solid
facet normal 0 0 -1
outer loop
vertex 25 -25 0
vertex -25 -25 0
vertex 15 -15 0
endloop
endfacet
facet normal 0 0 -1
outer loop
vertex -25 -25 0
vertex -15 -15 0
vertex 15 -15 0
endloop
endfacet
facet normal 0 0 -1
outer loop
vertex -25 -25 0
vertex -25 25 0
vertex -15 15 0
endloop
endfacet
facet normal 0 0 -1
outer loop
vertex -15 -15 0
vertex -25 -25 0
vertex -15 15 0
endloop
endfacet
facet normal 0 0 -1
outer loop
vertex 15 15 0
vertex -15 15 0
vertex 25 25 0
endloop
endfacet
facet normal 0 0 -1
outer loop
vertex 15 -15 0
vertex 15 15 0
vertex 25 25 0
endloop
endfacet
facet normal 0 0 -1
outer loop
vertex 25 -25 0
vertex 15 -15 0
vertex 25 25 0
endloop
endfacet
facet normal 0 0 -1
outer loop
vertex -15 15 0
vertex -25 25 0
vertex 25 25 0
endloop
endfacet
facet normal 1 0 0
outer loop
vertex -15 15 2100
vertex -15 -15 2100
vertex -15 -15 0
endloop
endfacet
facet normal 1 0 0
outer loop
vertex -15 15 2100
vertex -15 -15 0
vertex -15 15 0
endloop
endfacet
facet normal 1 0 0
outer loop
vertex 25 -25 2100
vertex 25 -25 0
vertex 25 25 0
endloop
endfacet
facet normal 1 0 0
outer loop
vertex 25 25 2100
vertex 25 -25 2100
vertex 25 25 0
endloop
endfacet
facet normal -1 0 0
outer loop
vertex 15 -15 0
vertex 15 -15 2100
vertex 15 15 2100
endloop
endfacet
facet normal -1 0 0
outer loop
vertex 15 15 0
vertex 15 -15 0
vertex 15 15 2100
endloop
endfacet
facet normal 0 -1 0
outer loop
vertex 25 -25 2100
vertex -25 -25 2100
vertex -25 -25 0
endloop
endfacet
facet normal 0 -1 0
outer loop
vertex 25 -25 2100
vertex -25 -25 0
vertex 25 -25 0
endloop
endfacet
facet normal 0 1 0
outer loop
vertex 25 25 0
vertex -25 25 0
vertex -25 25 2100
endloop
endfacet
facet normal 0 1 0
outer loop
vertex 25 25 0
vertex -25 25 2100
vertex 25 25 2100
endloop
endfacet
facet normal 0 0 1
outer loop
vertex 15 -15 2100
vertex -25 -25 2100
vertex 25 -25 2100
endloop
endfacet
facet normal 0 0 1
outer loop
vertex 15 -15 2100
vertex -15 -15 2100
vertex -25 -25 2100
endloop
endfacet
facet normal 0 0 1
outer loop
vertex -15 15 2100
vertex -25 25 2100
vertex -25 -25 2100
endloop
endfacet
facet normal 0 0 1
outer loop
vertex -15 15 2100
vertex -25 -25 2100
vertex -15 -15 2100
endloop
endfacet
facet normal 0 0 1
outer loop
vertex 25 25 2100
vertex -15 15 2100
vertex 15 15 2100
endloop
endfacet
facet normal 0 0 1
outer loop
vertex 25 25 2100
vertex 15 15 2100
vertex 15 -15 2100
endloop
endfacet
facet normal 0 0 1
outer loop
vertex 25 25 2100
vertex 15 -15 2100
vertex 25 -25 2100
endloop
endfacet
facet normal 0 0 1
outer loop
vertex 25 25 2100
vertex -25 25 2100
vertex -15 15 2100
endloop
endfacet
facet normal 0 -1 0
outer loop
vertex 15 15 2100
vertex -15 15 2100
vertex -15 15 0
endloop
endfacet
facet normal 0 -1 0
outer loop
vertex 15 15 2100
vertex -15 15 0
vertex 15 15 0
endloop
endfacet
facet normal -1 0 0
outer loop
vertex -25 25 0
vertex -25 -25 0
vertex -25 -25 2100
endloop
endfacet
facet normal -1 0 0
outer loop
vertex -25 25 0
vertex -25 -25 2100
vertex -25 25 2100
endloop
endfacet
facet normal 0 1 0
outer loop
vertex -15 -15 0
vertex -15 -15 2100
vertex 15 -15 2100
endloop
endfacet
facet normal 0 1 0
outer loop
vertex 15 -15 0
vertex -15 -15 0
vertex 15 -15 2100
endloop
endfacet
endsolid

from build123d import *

# Parameters (mm, degrees)
SKETCH1_W                 = 50
SKETCH1_H                 = 50
SKETCH1_W_2               = 30
SKETCH1_H_2               = 30
BOSS_EXTRUDE1_DEPTH       = 2100
SKETCH2_W                 = 50
SKETCH2_H                 = 50
BOSS_EXTRUDE2_DEPTH       = 5100
SKETCH4_W                 = 50
SKETCH4_H                 = 50
SKETCH4_W_2               = 30
SKETCH4_H_2               = 30
BOSS_EXTRUDE3_DEPTH       = 2100
SKETCH5_W                 = 50
SKETCH5_H                 = 50
BOSS_EXTRUDE4_DEPTH       = 1800
LPATTERN1_COUNT           = 2
LPATTERN1_PITCH           = 2000
SKETCH6_W                 = 100
SKETCH6_H                 = 150
BOSS_EXTRUDE5_DEPTH       = 5
SKETCH7_W                 = 100
SKETCH7_H                 = 150
BOSS_EXTRUDE6_DEPTH       = 5
SKETCH8_W                 = 100
SKETCH8_H                 = 150
BOSS_EXTRUDE7_DEPTH       = 5
SKETCH9_W                 = 100
SKETCH9_H                 = 150
BOSS_EXTRUDE8_DEPTH       = 5
SKETCH10_W                = 100
SKETCH10_H                = 5
BOSS_EXTRUDE9_DEPTH       = 20
SKETCH11_W                = 100
SKETCH11_H                = 5
BOSS_EXTRUDE10_DEPTH      = 20
SKETCH12_W                = 100
SKETCH12_H                = 5
BOSS_EXTRUDE11_DEPTH      = 20
SKETCH13_W                = 100
SKETCH13_H                = 5
BOSS_EXTRUDE12_DEPTH      = 20
F_5_0MM_DOWEL_HOLE1_D     = 5
F_5_0MM_DOWEL_HOLE1_DEPTH = 20
F_5_0MM_DOWEL_HOLE1_TIP   = 1.502151548
F_5_0MM_DOWEL_HOLE2_D     = 5
F_5_0MM_DOWEL_HOLE2_DEPTH = 20
F_5_0MM_DOWEL_HOLE2_TIP   = 1.502151548
F_5_0MM_DOWEL_HOLE3_D     = 5
F_5_0MM_DOWEL_HOLE3_DEPTH = 20
F_5_0MM_DOWEL_HOLE3_TIP   = 1.502151548
F_5_0MM_DOWEL_HOLE4_D     = 5
F_5_0MM_DOWEL_HOLE4_DEPTH = 20
F_5_0MM_DOWEL_HOLE4_TIP   = 1.502151548
SKETCH26_W                = 5305.980467783
SKETCH26_H                = 67.779411833
CUT_EXTRUDE1_DEPTH        = 5613.586302232
SPLIT1_OUTLINE_W          = 5150
SPLIT1_OUTLINE_H          = 50
SPLIT1_OUTLINE_W_2        = 30
SPLIT1_OUTLINE_H_2        = 30
SPLIT1_DEPTH              = 2100
SPLIT1_START              = -5
SPLIT1_2_OUTLINE_W        = 100
SPLIT1_2_OUTLINE_H        = 120
SPLIT1_2_OUTLINE_R        = 2.5
SPLIT1_2_DEPTH            = 2110
SPLIT3_START              = -5
SPLIT3_OUTLINE_W          = 100
SPLIT3_OUTLINE_H          = 120
SPLIT3_OUTLINE_R          = 2.5
SPLIT3_DEPTH              = 5
SPLIT4_START              = 2100
SPLIT4_OUTLINE_W          = 100
SPLIT4_OUTLINE_H          = 120
SPLIT4_OUTLINE_R          = 2.5
SPLIT4_DEPTH              = 5


# Read off the part's stored shape, not the designer's step: Split1, Split3, Split4
with BuildPart() as part:
    # Sketch1 → Boss-Extrude1 (new body)
    with BuildSketch(Plane.XY):
        Rectangle(SKETCH1_W, SKETCH1_H)
        Rectangle(SKETCH1_W_2, SKETCH1_H_2, mode=Mode.SUBTRACT)
    extrude(amount=BOSS_EXTRUDE1_DEPTH)

    # Sketch2 → Boss-Extrude2 (add)
    with BuildSketch(Plane.ZY.offset(25)):
        with Locations((125, 0)):
            Rectangle(SKETCH2_W, SKETCH2_H)
        with Locations((1975, 0)):
            Rectangle(SKETCH2_W, SKETCH2_H)
    extrude(amount=BOSS_EXTRUDE2_DEPTH)

    # Sketch4 → Boss-Extrude3 (add)
    with BuildSketch(Plane.XY):
        with Locations((-5150, 0)):
            Rectangle(SKETCH4_W, SKETCH4_H)
        with Locations((-5150, 0)):
            Rectangle(SKETCH4_W_2, SKETCH4_H_2, mode=Mode.SUBTRACT)
    extrude(amount=BOSS_EXTRUDE3_DEPTH)

    # Sketch5 → Boss-Extrude4 (add)
    with BuildSketch(Plane(origin=(0, 0, 1950), x_dir=(-1, 0, 0), z_dir=(0, 0, -1))):
        with Locations((1550, 0)):
            Rectangle(SKETCH5_W, SKETCH5_H)
    boss_extrude4 = extrude(amount=BOSS_EXTRUDE4_DEPTH)

    # LPattern1: Boss-Extrude4 ×2
    with Locations(*[(-i * LPATTERN1_PITCH, 0, 0) for i in range(1, LPATTERN1_COUNT)]):
        add(boss_extrude4)

    # Sketch6 → Boss-Extrude5 (add)
    with BuildSketch(Plane(origin=(0, 0, 0), x_dir=(-1, 0, 0), z_dir=(0, 0, -1))):
        Rectangle(SKETCH6_W, SKETCH6_H)
    extrude(amount=BOSS_EXTRUDE5_DEPTH)

    # Sketch7 → Boss-Extrude6 (add)
    with BuildSketch(Plane(origin=(0, 0, 0), x_dir=(-1, 0, 0), z_dir=(0, 0, -1))):
        with Locations((5150, 0)):
            Rectangle(SKETCH7_W, SKETCH7_H)
    extrude(amount=BOSS_EXTRUDE6_DEPTH)

    # Sketch8 → Boss-Extrude7 (add)
    with BuildSketch(Plane.XY.offset(2100)):
        with Locations((-5150, 0)):
            Rectangle(SKETCH8_W, SKETCH8_H)
    extrude(amount=BOSS_EXTRUDE7_DEPTH)

    # Sketch9 → Boss-Extrude8 (add)
    with BuildSketch(Plane.XY.offset(2100)):
        Rectangle(SKETCH9_W, SKETCH9_H)
    extrude(amount=BOSS_EXTRUDE8_DEPTH)

    # Sketch10 → Boss-Extrude9 (add)
    with BuildSketch(Plane(origin=(0, 75, 0), x_dir=(1, 0, 0), z_dir=(0, 1, 0))):
        with Locations((0, -2102.5)):
            Rectangle(SKETCH10_W, SKETCH10_H)
    extrude(amount=BOSS_EXTRUDE9_DEPTH)

    # Sketch11 → Boss-Extrude10 (add)
    with BuildSketch(Plane(origin=(0, 75, 0), x_dir=(1, 0, 0), z_dir=(0, 1, 0))):
        with Locations((0, 2.5)):
            Rectangle(SKETCH11_W, SKETCH11_H)
    extrude(amount=BOSS_EXTRUDE10_DEPTH)

    # Sketch12 → Boss-Extrude11 (add)
    with BuildSketch(Plane(origin=(0, 75, 0), x_dir=(1, 0, 0), z_dir=(0, 1, 0))):
        with Locations((-5150, 2.5)):
            Rectangle(SKETCH12_W, SKETCH12_H)
    extrude(amount=BOSS_EXTRUDE11_DEPTH)

    # Sketch13 → Boss-Extrude12 (add)
    with BuildSketch(Plane(origin=(0, 75, 0), x_dir=(1, 0, 0), z_dir=(0, 1, 0))):
        with Locations((-5150, -2102.5)):
            Rectangle(SKETCH13_W, SKETCH13_H)
    extrude(amount=BOSS_EXTRUDE12_DEPTH)

    # Ø5.0mm Dowel Hole1
    with Locations(Plane(origin=(0, 0, -5), x_dir=(-1, 0, 0), z_dir=(0, 0, -1))):
        with Locations((5110, 75), (5190, 75), (5190, -15), (5110, -15)):
            Hole(F_5_0MM_DOWEL_HOLE1_D / 2, depth=F_5_0MM_DOWEL_HOLE1_DEPTH)
            with Locations((0, 0, -(F_5_0MM_DOWEL_HOLE1_DEPTH + F_5_0MM_DOWEL_HOLE1_TIP / 2))):  # 118° drill point
                Cone(0, F_5_0MM_DOWEL_HOLE1_D / 2, F_5_0MM_DOWEL_HOLE1_TIP, mode=Mode.SUBTRACT)

    # Ø5.0mm Dowel Hole2
    with Locations(Plane(origin=(0, 0, -5), x_dir=(-1, 0, 0), z_dir=(0, 0, -1))):
        with Locations((-40, -15), (-40, 75), (40, 75), (40, -15)):
            Hole(F_5_0MM_DOWEL_HOLE2_D / 2, depth=F_5_0MM_DOWEL_HOLE2_DEPTH)
            with Locations((0, 0, -(F_5_0MM_DOWEL_HOLE2_DEPTH + F_5_0MM_DOWEL_HOLE2_TIP / 2))):  # 118° drill point
                Cone(0, F_5_0MM_DOWEL_HOLE2_D / 2, F_5_0MM_DOWEL_HOLE2_TIP, mode=Mode.SUBTRACT)

    # Ø5.0mm Dowel Hole3
    with Locations(Plane.XY.offset(2105)):
        with Locations((-40, -15), (-40, 75), (40, 75), (40, -15)):
            Hole(F_5_0MM_DOWEL_HOLE3_D / 2, depth=F_5_0MM_DOWEL_HOLE3_DEPTH)
            with Locations((0, 0, -(F_5_0MM_DOWEL_HOLE3_DEPTH + F_5_0MM_DOWEL_HOLE3_TIP / 2))):  # 118° drill point
                Cone(0, F_5_0MM_DOWEL_HOLE3_D / 2, F_5_0MM_DOWEL_HOLE3_TIP, mode=Mode.SUBTRACT)

    # Ø5.0mm Dowel Hole4
    with Locations(Plane.XY.offset(2105)):
        with Locations((-5190, 75), (-5110, 75), (-5110, -15), (-5190, -15)):
            Hole(F_5_0MM_DOWEL_HOLE4_D / 2, depth=F_5_0MM_DOWEL_HOLE4_DEPTH)
            with Locations((0, 0, -(F_5_0MM_DOWEL_HOLE4_DEPTH + F_5_0MM_DOWEL_HOLE4_TIP / 2))):  # 118° drill point
                Cone(0, F_5_0MM_DOWEL_HOLE4_D / 2, F_5_0MM_DOWEL_HOLE4_TIP, mode=Mode.SUBTRACT)

    # Sketch26 → Cut-Extrude1 (cut, through all)
    with BuildSketch(Plane.XY.offset(2105)):
        with Locations((-2547.009766109, -58.889705917)):
            Rectangle(SKETCH26_W, SKETCH26_H)
    extrude(amount=-CUT_EXTRUDE1_DEPTH, mode=Mode.SUBTRACT)

    # Split1 outline → Split1 (cut)
    with BuildSketch(Plane.XY):
        with Locations((-2600, 0)):
            Rectangle(SPLIT1_OUTLINE_W, SPLIT1_OUTLINE_H)
        with Locations((-5150, 0)):
            Rectangle(SPLIT1_OUTLINE_W_2, SPLIT1_OUTLINE_H_2, mode=Mode.SUBTRACT)
    extrude(amount=SPLIT1_DEPTH, mode=Mode.SUBTRACT)

    # Split1 2 outline → Split1 2 (cut)
    with BuildSketch(Plane.XY.offset(SPLIT1_START)):
        with Locations((-5150, 35)):
            Rectangle(SPLIT1_2_OUTLINE_W, SPLIT1_2_OUTLINE_H)
        with Locations((-5190, -15)):
            Circle(SPLIT1_2_OUTLINE_R, mode=Mode.SUBTRACT)
        with Locations((-5190, 75)):
            Circle(SPLIT1_2_OUTLINE_R, mode=Mode.SUBTRACT)
        with Locations((-5110, 75)):
            Circle(SPLIT1_2_OUTLINE_R, mode=Mode.SUBTRACT)
        with Locations((-5110, -15)):
            Circle(SPLIT1_2_OUTLINE_R, mode=Mode.SUBTRACT)
    extrude(amount=SPLIT1_2_DEPTH, mode=Mode.SUBTRACT)

    # Split3 outline → Split3 (cut)
    with BuildSketch(Plane.XY.offset(SPLIT3_START)):
        with Locations((0, 35)):
            Rectangle(SPLIT3_OUTLINE_W, SPLIT3_OUTLINE_H)
        with Locations((-40, -15)):
            Circle(SPLIT3_OUTLINE_R, mode=Mode.SUBTRACT)
        with Locations((40, -15)):
            Circle(SPLIT3_OUTLINE_R, mode=Mode.SUBTRACT)
        with Locations((-40, 75)):
            Circle(SPLIT3_OUTLINE_R, mode=Mode.SUBTRACT)
        with Locations((40, 75)):
            Circle(SPLIT3_OUTLINE_R, mode=Mode.SUBTRACT)
    extrude(amount=SPLIT3_DEPTH, mode=Mode.SUBTRACT)

    # Split4 outline → Split4 (cut)
    with BuildSketch(Plane.XY.offset(SPLIT4_START)):
        with Locations((0, 35)):
            Rectangle(SPLIT4_OUTLINE_W, SPLIT4_OUTLINE_H)
        with Locations((-40, -15)):
            Circle(SPLIT4_OUTLINE_R, mode=Mode.SUBTRACT)
        with Locations((40, -15)):
            Circle(SPLIT4_OUTLINE_R, mode=Mode.SUBTRACT)
        with Locations((-40, 75)):
            Circle(SPLIT4_OUTLINE_R, mode=Mode.SUBTRACT)
        with Locations((40, 75)):
            Circle(SPLIT4_OUTLINE_R, mode=Mode.SUBTRACT)
    extrude(amount=SPLIT4_DEPTH, mode=Mode.SUBTRACT)


solid = part.part
